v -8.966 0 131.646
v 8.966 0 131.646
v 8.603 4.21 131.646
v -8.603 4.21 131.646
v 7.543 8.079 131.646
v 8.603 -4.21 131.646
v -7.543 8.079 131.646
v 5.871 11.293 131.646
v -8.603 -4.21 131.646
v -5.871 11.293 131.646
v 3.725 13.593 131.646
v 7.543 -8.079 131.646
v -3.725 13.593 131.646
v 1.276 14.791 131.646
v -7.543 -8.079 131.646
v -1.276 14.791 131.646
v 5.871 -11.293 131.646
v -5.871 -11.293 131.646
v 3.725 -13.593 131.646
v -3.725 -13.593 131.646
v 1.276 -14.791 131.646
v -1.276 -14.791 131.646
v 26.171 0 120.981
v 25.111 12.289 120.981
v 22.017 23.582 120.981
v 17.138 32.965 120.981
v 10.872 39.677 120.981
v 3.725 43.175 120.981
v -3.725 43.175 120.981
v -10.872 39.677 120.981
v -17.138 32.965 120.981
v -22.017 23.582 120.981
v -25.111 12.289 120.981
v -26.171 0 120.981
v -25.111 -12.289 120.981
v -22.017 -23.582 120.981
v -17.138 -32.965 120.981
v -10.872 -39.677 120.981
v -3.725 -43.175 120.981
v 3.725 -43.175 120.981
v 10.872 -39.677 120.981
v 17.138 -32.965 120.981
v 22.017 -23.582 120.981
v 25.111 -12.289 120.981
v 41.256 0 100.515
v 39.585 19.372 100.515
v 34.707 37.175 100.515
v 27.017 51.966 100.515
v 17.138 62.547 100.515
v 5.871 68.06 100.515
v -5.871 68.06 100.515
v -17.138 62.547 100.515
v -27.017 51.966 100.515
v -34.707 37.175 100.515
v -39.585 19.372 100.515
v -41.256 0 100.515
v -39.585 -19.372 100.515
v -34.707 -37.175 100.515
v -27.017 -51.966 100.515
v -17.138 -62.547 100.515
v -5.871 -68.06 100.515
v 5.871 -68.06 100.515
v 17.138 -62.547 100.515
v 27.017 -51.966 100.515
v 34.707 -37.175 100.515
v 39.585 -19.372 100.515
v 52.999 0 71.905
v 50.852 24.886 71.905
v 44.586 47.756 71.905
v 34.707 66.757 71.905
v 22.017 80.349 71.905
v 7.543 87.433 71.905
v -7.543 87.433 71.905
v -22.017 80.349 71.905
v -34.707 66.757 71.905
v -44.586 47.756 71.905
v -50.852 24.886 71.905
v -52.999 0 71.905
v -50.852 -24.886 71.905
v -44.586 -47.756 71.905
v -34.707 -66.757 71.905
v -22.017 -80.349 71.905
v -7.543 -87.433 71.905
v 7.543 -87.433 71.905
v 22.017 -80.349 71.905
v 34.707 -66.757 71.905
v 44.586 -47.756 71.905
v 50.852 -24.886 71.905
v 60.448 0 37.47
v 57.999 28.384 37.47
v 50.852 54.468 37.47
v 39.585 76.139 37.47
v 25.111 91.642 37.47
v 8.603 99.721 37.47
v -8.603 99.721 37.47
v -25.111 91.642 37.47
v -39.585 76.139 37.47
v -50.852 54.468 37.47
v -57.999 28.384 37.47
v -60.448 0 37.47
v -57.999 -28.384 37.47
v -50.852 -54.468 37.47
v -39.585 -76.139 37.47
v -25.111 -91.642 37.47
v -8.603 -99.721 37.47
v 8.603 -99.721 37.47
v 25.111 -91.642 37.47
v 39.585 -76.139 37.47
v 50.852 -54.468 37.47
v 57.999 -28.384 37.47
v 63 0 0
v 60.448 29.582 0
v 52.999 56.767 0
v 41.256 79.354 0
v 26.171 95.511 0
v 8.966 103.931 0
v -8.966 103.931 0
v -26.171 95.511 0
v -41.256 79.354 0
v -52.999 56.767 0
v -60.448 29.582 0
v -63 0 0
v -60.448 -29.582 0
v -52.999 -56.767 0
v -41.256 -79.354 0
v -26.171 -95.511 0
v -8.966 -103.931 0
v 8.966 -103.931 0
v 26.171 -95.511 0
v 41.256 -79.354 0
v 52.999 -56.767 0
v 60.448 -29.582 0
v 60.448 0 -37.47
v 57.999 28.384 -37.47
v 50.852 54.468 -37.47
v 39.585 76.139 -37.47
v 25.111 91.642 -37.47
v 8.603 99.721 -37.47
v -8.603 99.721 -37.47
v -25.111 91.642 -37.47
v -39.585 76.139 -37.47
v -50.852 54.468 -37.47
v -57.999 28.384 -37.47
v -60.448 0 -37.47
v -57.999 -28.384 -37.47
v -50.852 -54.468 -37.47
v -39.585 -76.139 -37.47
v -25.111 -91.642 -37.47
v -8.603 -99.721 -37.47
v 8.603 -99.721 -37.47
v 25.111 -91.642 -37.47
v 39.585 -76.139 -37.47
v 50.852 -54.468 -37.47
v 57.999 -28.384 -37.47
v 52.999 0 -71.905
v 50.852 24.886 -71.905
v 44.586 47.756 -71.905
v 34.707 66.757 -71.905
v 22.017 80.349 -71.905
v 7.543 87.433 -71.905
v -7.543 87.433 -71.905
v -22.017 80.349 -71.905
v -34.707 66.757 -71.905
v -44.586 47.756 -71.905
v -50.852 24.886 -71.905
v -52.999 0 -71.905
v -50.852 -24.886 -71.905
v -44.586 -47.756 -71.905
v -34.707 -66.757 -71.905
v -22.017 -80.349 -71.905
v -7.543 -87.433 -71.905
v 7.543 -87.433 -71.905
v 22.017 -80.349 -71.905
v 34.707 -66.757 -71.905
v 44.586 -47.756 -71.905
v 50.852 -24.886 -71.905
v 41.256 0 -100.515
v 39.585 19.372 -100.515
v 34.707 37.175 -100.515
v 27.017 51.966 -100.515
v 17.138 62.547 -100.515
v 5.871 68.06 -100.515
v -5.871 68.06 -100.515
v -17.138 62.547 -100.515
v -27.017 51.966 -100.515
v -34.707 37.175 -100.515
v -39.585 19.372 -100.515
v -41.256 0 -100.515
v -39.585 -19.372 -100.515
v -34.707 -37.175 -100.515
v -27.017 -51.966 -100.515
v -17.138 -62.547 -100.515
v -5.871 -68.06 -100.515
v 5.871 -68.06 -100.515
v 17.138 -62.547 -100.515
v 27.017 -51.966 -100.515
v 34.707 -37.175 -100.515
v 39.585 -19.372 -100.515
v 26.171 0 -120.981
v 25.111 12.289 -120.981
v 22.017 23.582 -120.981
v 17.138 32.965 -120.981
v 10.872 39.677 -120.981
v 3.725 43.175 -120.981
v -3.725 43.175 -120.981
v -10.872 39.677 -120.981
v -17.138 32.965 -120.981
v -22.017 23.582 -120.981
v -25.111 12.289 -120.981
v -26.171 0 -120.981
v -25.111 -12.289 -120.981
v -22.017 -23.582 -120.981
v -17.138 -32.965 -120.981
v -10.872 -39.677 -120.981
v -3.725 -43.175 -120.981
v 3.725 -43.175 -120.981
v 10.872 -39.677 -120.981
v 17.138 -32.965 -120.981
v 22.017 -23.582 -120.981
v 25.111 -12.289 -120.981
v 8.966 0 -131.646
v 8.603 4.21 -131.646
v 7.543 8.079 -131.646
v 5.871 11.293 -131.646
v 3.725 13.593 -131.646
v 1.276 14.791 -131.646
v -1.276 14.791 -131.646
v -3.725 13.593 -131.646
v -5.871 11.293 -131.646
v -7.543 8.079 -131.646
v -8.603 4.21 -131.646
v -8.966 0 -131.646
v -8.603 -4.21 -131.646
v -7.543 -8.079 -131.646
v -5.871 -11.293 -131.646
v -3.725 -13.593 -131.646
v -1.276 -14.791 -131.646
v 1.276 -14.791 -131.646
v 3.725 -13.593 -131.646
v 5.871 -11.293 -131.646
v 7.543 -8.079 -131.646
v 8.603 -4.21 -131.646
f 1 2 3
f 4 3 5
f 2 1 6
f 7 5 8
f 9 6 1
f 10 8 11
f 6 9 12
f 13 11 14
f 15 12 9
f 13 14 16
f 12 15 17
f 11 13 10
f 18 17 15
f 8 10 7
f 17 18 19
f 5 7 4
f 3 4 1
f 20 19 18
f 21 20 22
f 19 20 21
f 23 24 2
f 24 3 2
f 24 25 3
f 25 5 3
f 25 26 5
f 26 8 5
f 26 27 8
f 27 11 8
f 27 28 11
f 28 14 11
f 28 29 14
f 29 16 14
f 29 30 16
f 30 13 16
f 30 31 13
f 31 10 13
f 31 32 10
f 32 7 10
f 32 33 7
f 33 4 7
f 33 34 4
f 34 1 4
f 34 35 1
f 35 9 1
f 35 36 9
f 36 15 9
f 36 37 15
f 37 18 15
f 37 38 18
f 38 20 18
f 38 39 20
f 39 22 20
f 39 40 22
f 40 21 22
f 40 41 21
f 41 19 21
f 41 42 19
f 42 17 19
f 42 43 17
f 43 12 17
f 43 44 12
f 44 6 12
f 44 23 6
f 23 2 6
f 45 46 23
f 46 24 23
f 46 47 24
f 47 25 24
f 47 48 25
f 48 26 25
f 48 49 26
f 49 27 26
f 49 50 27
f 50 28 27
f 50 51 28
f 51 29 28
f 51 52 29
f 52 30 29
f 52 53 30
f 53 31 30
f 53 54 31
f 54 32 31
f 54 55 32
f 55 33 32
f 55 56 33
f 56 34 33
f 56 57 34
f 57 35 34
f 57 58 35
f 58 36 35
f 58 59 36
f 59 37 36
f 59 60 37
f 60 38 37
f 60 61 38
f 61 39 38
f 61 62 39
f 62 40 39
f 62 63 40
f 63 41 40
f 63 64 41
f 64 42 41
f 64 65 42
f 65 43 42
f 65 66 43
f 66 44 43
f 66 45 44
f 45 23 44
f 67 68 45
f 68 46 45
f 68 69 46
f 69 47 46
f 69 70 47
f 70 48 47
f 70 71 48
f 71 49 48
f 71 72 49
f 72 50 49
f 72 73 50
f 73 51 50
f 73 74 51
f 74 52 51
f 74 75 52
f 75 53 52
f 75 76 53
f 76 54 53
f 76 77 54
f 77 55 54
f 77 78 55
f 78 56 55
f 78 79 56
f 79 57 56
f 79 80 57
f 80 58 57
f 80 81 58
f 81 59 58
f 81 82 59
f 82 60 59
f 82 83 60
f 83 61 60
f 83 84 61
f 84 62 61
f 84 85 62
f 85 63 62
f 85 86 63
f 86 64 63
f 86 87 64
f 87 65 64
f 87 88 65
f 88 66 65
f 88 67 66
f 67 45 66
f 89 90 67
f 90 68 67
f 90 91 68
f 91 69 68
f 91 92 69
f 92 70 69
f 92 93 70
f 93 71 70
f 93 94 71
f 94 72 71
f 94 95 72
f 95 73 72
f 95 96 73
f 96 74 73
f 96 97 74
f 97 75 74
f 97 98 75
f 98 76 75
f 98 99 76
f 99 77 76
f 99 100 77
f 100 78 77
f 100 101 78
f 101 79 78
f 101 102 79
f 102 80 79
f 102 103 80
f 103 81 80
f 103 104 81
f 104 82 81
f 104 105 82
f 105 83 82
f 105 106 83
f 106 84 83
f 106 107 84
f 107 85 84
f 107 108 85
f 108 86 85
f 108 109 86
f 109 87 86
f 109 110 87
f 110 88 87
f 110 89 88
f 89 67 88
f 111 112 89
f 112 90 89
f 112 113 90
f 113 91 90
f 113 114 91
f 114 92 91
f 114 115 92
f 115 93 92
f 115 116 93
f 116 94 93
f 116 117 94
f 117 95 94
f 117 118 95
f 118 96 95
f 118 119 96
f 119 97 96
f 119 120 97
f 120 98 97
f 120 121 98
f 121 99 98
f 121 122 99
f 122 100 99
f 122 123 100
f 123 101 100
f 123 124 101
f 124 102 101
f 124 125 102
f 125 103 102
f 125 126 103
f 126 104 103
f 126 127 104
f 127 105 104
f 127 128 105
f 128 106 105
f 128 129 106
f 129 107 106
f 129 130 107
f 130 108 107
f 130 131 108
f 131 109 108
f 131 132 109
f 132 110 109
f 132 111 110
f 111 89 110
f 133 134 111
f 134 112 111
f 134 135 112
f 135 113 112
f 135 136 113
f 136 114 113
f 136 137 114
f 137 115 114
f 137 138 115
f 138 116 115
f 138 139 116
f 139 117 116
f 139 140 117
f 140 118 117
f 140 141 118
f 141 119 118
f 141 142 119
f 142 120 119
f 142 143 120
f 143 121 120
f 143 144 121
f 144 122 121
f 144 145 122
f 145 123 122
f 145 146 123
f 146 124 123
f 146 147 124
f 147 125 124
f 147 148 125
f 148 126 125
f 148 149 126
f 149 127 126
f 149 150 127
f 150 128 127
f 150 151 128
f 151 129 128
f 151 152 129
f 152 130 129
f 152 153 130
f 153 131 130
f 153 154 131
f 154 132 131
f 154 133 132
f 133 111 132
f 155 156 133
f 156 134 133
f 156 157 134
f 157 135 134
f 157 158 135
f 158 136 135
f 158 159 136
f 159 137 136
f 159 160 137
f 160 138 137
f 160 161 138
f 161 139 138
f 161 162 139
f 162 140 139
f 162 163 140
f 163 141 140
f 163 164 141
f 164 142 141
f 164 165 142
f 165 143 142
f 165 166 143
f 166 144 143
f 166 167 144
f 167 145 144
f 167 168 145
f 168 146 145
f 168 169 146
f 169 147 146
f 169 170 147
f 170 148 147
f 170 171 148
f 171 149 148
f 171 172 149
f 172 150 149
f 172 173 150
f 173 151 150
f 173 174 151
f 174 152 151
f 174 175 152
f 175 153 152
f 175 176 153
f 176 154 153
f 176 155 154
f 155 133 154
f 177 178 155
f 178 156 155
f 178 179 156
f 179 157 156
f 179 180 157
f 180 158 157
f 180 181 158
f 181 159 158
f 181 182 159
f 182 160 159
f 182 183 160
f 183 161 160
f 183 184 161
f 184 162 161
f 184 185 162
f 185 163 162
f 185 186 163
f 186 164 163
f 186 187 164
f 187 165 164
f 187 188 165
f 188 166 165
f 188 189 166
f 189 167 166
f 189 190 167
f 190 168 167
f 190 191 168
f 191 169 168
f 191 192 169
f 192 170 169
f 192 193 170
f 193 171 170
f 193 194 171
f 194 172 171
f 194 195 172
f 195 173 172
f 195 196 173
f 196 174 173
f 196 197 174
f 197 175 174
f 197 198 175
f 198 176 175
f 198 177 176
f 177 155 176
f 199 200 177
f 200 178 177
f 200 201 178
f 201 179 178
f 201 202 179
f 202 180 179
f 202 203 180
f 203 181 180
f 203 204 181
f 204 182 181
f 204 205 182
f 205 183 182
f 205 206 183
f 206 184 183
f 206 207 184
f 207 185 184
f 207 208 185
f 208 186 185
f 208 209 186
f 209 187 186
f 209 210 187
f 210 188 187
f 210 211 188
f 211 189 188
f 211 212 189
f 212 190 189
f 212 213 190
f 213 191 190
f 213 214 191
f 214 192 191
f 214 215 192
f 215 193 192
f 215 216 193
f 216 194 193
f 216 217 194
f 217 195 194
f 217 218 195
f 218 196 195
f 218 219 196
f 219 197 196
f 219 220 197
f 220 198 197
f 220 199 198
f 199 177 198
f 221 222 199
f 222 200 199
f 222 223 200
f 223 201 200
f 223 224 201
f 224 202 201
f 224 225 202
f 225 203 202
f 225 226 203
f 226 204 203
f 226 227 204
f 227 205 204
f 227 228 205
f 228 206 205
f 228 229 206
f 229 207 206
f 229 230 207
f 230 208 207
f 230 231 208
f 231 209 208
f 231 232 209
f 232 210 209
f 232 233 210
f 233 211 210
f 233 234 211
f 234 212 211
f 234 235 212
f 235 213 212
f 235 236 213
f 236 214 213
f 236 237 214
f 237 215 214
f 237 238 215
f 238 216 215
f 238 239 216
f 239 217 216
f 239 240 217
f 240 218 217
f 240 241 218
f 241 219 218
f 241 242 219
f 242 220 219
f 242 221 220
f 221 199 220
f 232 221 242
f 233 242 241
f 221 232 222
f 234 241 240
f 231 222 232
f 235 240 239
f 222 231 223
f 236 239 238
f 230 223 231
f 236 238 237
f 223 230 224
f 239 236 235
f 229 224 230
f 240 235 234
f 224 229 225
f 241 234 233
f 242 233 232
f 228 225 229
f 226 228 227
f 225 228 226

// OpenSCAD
// Generated by SolidPython 1.0.1 on 2020-07-29 00:46:49


scale(v = [9, 15, 19]) {
	sphere(r = 7);
}
/***********************************************
*********      SolidPython code:      **********
************************************************
 
# import packages: SolidPython
from solid import *
from solid.utils import *
from itertools import chain, combinations, permutations


class Resize:

    def __init__(self, scad_file):
        self.scad_file = scad_file
        #self.scad_file = import_scad(scad_file)
        # cone/cylinder param:
        self.r1 = 0
        self.r2 = 0
        self.h = 0
        # rectangular prism param:
        self.w = 0
        self.l = 0
        # ellipse param:
        self.r = 0

    # import OpenScad code (file name corresponds to shape)


    # classify shape + parameters
    def assign(self, param1, param2, param3):
        if self.scad_file == 'cone.scad':
            self.r1 = param1
            self.r2 = param2
            self.h = param3
        elif self.scad_file == 'cylinder.scad':
            self.r1 = param1
            self.r2 = param2
            self.h = param3
        elif self.scad_file == 'rectangularPrism.scad':
            self.h = param1
            self.l = param2
            self.w = param3
        else:
            self.r = param1
            self.h = param2

    # resize parameters
    def iterate(self):
        x = range(3, 20, 2)
        i = 1
        if self.scad_file == 'cone.scad':
            tempList = list(permutations(x, 2))
            for temp in tempList:
                param1 = temp[0]
                param2 = temp[1]
                filepath = 'produced_scad_files/' + 'cone' + str(param1) + '_' + str(param2) + '_' + '.scad'
                scad_render_to_file(cylinder(h=param1, r1=param2, r2=0), filepath)

        elif self.scad_file == 'cylinder.scad':
            tempList = list(permutations(x, 3))
            for temp in tempList:
                param1 = temp[0]
                param2 = temp[1]
                filepath = 'produced_scad_files/' + 'cylinder' + str(param1) + '_' + str(param2) + '_' + '.scad'
                scad_render_to_file(cylinder(h=param1, r1=param2, r2=param2), filepath)

        elif self.scad_file == 'rectangularPrism.scad':
            tempList = list(permutations(x, 3))
            for temp in tempList:
                param1 = temp[0]
                param2 = temp[1]
                param3 = temp[2]
                filepath = 'produced_scad_files/' + 'rectangularPrism' + str(param1) + '_' + str(param2) + '_' + str(
                    param3) + '.scad'
                scad_render_to_file(cube(size=(param1, param2, param3)), filepath)

        elif self.scad_file == 'ellipse.scad':
            tempList = list(permutations(x, 4))
            for temp in tempList:
                param1 = temp[0]
                param2 = temp[1]
                param3 = temp[2]
                param4 = temp[3]
                filepath = 'produced_scad_files/' + 'ellipse' + str(param1) + '_' + str(param2) + '_' + str(param3) + '_' + str(param4) + '.scad'
                scad_render_to_file(scale([param1, param2, param3])(sphere(r=param4)), filepath)

    def render_to_scadfile(self):
        scad_render_to_file(scad, 'example.scad') 
 
************************************************/
